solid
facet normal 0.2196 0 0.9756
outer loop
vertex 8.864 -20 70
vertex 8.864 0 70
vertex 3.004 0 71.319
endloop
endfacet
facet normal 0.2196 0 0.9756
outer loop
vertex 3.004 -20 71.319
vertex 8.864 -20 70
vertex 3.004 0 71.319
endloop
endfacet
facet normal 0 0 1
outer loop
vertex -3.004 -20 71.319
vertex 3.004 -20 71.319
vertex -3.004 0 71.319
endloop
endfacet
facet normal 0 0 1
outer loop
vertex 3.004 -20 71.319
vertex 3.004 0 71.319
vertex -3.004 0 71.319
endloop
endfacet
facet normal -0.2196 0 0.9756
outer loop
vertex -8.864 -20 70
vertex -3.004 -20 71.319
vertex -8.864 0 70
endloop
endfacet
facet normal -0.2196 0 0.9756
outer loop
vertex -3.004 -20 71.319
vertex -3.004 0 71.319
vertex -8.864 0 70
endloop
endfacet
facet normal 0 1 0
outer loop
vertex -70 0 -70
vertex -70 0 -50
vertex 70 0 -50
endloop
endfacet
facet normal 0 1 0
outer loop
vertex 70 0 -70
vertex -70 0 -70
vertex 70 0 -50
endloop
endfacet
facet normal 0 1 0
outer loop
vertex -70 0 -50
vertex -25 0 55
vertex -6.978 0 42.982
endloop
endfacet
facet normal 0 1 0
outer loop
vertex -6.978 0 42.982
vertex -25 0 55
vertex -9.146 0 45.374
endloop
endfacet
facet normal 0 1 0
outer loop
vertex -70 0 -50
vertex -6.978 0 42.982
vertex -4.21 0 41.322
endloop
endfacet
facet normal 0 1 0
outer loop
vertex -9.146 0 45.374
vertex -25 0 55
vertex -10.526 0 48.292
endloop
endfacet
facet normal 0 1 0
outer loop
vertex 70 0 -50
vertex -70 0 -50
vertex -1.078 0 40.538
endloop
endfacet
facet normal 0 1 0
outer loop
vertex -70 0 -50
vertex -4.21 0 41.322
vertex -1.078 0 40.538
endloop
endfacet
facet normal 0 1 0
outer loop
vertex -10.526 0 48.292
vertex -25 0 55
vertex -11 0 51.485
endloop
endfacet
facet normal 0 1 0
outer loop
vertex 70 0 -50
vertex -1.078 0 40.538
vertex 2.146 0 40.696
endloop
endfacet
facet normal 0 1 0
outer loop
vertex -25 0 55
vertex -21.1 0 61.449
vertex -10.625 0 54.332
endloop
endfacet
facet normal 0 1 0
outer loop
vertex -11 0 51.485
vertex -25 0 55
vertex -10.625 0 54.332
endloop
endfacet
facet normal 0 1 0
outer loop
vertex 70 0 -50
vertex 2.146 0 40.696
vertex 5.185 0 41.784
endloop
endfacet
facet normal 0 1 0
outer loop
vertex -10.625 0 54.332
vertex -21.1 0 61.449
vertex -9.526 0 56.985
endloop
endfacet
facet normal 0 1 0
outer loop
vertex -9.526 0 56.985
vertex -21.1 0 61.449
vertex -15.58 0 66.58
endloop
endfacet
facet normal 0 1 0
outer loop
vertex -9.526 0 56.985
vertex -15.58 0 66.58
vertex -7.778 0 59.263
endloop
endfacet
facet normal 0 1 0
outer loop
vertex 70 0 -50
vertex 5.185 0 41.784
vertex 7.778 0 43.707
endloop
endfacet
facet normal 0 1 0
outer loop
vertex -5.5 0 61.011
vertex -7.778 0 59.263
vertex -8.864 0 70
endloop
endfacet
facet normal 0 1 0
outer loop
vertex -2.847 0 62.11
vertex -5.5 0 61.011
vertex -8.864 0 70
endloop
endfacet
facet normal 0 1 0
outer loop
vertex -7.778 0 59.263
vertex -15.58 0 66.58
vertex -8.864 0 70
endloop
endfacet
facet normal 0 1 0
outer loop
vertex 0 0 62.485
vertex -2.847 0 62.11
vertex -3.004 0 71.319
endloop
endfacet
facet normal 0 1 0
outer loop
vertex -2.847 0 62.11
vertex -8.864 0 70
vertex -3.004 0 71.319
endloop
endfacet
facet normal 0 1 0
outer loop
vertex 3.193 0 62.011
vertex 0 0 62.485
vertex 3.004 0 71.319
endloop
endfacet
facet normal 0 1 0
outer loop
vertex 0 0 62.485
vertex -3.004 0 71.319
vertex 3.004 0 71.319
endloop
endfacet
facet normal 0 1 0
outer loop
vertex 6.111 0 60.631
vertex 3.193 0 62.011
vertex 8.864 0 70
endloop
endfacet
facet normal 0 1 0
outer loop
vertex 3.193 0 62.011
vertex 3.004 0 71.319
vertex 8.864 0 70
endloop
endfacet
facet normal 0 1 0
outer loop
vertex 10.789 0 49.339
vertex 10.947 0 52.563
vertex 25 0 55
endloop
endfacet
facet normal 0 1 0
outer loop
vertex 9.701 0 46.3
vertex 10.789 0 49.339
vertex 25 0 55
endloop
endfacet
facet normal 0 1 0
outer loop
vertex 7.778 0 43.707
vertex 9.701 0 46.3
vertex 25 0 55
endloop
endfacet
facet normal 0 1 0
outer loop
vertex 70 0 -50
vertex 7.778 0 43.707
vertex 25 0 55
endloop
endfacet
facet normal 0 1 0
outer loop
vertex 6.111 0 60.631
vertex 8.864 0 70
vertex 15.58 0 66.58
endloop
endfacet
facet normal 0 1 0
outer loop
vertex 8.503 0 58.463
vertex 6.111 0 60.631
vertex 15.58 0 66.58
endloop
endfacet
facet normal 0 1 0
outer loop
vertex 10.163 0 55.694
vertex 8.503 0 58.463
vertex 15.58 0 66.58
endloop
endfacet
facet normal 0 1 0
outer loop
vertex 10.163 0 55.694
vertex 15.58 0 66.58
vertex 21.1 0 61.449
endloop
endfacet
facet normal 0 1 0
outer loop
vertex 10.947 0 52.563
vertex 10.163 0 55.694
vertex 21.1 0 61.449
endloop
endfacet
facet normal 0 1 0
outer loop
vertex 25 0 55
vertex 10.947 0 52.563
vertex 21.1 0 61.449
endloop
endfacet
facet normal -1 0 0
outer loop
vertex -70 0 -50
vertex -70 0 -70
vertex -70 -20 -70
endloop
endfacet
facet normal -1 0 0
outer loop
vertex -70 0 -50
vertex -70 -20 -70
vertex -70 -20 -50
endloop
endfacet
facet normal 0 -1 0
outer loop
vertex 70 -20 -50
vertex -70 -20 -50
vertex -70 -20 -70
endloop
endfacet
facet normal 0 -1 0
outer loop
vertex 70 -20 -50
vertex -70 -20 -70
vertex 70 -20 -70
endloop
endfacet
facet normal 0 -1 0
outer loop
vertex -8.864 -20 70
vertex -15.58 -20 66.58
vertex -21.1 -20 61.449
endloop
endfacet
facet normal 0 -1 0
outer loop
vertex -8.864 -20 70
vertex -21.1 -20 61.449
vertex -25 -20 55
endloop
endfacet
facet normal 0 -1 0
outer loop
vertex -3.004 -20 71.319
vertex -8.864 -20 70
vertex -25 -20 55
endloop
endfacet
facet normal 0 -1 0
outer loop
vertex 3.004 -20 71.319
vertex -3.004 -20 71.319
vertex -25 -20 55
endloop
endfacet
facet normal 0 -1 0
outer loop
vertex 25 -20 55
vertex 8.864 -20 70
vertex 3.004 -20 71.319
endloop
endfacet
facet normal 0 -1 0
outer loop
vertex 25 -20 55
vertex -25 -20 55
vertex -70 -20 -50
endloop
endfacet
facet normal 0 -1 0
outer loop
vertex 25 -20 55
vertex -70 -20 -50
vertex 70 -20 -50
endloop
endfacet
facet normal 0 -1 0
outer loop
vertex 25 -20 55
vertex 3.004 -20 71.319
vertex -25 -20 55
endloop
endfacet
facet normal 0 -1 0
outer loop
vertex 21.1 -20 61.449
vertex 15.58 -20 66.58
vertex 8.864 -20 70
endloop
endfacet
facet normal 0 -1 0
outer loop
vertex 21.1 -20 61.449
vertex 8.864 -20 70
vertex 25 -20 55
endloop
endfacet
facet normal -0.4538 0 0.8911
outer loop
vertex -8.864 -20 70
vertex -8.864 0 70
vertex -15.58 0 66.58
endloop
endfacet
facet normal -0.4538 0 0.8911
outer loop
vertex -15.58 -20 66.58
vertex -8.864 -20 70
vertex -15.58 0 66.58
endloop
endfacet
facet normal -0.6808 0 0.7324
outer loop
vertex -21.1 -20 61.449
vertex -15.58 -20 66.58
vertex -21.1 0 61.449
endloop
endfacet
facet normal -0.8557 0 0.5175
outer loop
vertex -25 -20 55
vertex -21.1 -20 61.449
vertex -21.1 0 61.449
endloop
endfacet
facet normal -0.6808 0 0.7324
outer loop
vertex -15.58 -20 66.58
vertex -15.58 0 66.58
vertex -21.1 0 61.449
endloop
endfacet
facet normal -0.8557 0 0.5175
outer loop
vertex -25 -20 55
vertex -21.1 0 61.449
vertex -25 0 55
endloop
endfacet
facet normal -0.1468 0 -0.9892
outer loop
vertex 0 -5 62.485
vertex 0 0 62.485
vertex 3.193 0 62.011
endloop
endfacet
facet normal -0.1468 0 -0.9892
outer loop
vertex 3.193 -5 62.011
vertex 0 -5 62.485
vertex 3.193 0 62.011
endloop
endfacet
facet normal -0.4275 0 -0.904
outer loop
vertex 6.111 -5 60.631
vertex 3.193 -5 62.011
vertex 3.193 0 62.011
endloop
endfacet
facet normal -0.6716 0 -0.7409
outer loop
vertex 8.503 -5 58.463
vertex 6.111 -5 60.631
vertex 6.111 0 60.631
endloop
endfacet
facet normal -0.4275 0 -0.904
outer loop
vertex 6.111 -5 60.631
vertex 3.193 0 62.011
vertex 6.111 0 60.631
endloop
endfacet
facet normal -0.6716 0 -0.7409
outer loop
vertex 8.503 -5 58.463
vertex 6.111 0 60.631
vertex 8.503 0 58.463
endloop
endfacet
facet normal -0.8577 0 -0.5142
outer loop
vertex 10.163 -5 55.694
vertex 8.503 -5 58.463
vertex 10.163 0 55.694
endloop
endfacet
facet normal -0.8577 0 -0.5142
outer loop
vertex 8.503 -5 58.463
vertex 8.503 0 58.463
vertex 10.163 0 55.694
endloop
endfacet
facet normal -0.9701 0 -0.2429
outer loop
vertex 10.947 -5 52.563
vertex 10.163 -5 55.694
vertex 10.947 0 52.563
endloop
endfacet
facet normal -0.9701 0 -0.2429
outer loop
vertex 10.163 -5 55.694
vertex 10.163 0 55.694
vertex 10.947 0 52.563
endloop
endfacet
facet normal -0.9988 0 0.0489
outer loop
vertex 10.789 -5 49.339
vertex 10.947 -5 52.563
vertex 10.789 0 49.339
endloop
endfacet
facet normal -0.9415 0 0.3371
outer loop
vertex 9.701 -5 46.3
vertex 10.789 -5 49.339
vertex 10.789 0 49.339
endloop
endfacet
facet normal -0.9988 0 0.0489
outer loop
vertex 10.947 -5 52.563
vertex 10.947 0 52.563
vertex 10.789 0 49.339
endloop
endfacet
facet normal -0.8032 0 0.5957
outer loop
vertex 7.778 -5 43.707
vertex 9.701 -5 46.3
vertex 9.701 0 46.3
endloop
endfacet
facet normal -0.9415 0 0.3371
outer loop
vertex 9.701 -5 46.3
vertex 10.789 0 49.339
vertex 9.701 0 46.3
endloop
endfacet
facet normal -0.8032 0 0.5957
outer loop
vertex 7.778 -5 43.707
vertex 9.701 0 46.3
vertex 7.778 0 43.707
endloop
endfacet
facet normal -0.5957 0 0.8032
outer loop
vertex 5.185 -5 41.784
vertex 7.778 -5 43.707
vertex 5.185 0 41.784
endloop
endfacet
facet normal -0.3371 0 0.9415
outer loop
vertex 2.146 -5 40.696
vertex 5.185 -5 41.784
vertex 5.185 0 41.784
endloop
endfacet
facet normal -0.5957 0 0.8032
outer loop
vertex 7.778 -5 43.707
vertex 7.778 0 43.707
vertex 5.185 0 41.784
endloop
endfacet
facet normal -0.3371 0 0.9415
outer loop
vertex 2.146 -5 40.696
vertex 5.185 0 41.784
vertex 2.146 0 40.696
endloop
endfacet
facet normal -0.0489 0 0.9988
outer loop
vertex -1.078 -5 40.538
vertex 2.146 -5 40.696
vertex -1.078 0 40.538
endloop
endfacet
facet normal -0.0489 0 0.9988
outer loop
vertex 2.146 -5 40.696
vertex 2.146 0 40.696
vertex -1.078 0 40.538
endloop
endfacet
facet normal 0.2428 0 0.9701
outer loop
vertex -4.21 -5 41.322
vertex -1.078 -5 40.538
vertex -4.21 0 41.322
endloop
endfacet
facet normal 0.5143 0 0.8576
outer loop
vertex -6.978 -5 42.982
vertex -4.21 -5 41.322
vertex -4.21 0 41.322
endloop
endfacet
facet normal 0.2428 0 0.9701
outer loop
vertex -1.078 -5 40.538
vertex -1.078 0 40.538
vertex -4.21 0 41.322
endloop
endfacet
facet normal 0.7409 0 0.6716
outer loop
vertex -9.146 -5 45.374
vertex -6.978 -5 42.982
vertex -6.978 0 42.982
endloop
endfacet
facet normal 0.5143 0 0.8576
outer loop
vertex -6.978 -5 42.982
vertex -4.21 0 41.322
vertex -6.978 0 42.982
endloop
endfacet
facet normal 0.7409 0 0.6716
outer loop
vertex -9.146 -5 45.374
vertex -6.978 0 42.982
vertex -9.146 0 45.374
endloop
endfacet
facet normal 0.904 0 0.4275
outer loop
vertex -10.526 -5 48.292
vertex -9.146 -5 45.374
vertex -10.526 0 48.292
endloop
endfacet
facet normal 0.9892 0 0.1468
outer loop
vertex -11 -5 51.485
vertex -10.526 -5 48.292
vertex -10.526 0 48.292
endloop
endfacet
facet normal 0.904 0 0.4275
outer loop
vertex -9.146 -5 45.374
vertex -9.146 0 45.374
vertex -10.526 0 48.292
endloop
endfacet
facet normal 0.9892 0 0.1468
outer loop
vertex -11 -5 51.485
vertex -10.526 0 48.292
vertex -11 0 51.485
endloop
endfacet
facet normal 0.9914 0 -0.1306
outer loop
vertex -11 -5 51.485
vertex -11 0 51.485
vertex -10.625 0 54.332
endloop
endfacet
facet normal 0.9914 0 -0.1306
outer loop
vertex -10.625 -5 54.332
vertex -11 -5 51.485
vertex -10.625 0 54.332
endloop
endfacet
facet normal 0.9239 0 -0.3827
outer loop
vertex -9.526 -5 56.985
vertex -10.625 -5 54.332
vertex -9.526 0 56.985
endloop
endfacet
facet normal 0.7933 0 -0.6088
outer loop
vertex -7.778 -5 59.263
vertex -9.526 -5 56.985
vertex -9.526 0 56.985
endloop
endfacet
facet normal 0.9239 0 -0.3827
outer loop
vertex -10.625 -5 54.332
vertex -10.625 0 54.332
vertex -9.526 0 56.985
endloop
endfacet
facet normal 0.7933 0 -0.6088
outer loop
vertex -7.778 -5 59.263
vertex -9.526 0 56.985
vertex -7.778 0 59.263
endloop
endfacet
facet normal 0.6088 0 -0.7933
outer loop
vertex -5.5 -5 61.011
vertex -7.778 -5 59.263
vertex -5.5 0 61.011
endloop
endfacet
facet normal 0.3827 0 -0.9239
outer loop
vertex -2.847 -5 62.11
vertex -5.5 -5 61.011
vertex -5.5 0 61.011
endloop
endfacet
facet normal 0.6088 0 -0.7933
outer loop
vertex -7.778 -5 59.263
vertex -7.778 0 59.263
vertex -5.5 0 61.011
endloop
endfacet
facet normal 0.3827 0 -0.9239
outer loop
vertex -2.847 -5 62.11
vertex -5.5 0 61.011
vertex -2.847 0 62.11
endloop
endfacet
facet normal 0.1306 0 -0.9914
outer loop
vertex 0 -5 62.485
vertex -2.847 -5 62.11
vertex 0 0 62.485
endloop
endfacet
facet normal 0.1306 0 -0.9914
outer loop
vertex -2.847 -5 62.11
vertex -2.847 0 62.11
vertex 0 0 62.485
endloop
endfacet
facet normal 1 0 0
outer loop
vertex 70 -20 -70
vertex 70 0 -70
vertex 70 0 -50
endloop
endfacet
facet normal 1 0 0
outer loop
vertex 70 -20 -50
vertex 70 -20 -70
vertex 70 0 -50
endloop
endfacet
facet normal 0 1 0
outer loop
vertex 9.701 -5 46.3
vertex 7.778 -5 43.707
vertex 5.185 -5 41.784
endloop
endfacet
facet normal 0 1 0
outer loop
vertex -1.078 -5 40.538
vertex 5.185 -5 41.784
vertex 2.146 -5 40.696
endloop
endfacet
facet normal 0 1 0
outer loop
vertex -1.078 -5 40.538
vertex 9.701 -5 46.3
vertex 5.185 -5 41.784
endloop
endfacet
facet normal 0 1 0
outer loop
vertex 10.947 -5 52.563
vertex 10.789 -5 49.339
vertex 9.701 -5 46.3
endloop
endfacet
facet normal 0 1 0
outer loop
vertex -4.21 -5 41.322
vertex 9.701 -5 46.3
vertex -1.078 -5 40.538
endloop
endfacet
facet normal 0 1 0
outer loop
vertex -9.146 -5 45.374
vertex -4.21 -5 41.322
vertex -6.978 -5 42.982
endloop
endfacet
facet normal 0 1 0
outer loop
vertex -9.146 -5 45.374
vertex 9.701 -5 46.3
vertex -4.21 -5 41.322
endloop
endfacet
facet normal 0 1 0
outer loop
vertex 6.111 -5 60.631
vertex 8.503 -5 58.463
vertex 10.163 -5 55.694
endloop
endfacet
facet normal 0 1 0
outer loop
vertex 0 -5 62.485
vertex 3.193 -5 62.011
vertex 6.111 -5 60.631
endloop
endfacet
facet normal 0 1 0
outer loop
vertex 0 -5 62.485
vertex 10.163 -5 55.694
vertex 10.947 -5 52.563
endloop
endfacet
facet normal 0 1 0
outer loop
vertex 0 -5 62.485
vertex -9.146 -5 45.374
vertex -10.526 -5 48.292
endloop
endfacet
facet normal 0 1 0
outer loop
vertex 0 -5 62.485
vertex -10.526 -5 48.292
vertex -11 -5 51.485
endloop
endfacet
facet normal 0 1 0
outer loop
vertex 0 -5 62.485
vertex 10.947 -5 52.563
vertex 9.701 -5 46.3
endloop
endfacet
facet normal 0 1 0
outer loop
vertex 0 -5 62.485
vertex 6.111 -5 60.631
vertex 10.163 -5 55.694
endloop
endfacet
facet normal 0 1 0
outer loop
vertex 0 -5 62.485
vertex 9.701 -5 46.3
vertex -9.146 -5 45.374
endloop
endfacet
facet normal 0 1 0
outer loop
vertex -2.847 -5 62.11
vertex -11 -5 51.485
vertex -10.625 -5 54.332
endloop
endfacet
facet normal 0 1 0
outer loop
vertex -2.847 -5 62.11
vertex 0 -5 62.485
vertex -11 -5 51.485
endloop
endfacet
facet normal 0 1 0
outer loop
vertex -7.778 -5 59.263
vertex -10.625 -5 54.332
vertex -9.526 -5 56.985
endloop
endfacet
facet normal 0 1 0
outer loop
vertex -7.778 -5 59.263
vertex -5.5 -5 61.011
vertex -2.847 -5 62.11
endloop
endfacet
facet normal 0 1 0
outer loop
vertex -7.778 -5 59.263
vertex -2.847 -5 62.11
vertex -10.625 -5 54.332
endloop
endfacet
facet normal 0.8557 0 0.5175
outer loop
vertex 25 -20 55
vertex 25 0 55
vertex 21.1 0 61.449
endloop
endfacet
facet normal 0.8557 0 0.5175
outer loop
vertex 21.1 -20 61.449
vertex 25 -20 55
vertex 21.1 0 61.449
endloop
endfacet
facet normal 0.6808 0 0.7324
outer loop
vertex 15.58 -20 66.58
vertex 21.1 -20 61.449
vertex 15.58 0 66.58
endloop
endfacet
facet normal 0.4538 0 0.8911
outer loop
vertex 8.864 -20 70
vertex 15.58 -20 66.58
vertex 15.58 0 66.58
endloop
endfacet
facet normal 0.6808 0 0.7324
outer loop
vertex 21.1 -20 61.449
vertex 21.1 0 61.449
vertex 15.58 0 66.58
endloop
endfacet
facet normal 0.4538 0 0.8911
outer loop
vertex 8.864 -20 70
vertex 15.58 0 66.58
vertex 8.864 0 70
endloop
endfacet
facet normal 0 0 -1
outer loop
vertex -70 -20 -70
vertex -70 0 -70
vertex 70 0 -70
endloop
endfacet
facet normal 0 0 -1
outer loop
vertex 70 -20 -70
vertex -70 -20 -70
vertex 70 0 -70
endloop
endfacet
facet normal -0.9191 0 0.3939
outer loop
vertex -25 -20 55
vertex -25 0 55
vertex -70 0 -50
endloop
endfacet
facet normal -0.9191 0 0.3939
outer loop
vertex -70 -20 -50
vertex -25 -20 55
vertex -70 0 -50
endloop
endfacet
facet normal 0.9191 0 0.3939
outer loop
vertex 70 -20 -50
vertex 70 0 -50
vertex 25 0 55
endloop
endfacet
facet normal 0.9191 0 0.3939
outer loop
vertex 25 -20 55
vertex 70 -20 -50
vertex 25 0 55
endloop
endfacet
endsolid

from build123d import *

# Parameters (mm, degrees)
F0_W     = 140
F0_H     = 20
F1_DEPTH = 20
F3_DEPTH = 5


with BuildPart() as f1:
    # F0 (on Front) → F1 (new body)
    with BuildSketch(Plane.XZ):
        with Locations((0, -60)):
            Rectangle(F0_W, F0_H)
        with BuildLine():
            Line((-70, -50), (70, -50))
            Line((70, -50), (25, 55))
            ThreePointArc((25, 55), (18.5187341548, 64.2068689629), (8.8640526043, 70))
            Line((8.8640526043, 70), (-8.8640526043, 70))
            ThreePointArc((-8.8640526043, 70), (-18.5187341548, 64.2068689629), (-25, 55))
            Line((-25, 55), (-70, -50))
        make_face()
        with BuildLine():
            Line((-8.8640526043, 70), (8.8640526043, 70))
            ThreePointArc((8.8640526043, 70), (0, 71.4849039495), (-8.8640526043, 70))
        make_face()
    extrude(amount=F1_DEPTH)

    # F2 (on face) → F3 (cut)
    with BuildSketch(Plane(origin=(0, 0, 0), x_dir=(-1, 0, 0), z_dir=(0, 1, 0))):
        with BuildLine():
            ThreePointArc((11, 51.4849039495), (7.7781745931, 59.2630785426), (0, 62.4849039495))
            ThreePointArc((0, 62.4849039495), (-7.7781745931, 43.7067293565), (11, 51.4849039495))
        make_face()
    extrude(amount=-F3_DEPTH, mode=Mode.SUBTRACT)


solid = f1.part
